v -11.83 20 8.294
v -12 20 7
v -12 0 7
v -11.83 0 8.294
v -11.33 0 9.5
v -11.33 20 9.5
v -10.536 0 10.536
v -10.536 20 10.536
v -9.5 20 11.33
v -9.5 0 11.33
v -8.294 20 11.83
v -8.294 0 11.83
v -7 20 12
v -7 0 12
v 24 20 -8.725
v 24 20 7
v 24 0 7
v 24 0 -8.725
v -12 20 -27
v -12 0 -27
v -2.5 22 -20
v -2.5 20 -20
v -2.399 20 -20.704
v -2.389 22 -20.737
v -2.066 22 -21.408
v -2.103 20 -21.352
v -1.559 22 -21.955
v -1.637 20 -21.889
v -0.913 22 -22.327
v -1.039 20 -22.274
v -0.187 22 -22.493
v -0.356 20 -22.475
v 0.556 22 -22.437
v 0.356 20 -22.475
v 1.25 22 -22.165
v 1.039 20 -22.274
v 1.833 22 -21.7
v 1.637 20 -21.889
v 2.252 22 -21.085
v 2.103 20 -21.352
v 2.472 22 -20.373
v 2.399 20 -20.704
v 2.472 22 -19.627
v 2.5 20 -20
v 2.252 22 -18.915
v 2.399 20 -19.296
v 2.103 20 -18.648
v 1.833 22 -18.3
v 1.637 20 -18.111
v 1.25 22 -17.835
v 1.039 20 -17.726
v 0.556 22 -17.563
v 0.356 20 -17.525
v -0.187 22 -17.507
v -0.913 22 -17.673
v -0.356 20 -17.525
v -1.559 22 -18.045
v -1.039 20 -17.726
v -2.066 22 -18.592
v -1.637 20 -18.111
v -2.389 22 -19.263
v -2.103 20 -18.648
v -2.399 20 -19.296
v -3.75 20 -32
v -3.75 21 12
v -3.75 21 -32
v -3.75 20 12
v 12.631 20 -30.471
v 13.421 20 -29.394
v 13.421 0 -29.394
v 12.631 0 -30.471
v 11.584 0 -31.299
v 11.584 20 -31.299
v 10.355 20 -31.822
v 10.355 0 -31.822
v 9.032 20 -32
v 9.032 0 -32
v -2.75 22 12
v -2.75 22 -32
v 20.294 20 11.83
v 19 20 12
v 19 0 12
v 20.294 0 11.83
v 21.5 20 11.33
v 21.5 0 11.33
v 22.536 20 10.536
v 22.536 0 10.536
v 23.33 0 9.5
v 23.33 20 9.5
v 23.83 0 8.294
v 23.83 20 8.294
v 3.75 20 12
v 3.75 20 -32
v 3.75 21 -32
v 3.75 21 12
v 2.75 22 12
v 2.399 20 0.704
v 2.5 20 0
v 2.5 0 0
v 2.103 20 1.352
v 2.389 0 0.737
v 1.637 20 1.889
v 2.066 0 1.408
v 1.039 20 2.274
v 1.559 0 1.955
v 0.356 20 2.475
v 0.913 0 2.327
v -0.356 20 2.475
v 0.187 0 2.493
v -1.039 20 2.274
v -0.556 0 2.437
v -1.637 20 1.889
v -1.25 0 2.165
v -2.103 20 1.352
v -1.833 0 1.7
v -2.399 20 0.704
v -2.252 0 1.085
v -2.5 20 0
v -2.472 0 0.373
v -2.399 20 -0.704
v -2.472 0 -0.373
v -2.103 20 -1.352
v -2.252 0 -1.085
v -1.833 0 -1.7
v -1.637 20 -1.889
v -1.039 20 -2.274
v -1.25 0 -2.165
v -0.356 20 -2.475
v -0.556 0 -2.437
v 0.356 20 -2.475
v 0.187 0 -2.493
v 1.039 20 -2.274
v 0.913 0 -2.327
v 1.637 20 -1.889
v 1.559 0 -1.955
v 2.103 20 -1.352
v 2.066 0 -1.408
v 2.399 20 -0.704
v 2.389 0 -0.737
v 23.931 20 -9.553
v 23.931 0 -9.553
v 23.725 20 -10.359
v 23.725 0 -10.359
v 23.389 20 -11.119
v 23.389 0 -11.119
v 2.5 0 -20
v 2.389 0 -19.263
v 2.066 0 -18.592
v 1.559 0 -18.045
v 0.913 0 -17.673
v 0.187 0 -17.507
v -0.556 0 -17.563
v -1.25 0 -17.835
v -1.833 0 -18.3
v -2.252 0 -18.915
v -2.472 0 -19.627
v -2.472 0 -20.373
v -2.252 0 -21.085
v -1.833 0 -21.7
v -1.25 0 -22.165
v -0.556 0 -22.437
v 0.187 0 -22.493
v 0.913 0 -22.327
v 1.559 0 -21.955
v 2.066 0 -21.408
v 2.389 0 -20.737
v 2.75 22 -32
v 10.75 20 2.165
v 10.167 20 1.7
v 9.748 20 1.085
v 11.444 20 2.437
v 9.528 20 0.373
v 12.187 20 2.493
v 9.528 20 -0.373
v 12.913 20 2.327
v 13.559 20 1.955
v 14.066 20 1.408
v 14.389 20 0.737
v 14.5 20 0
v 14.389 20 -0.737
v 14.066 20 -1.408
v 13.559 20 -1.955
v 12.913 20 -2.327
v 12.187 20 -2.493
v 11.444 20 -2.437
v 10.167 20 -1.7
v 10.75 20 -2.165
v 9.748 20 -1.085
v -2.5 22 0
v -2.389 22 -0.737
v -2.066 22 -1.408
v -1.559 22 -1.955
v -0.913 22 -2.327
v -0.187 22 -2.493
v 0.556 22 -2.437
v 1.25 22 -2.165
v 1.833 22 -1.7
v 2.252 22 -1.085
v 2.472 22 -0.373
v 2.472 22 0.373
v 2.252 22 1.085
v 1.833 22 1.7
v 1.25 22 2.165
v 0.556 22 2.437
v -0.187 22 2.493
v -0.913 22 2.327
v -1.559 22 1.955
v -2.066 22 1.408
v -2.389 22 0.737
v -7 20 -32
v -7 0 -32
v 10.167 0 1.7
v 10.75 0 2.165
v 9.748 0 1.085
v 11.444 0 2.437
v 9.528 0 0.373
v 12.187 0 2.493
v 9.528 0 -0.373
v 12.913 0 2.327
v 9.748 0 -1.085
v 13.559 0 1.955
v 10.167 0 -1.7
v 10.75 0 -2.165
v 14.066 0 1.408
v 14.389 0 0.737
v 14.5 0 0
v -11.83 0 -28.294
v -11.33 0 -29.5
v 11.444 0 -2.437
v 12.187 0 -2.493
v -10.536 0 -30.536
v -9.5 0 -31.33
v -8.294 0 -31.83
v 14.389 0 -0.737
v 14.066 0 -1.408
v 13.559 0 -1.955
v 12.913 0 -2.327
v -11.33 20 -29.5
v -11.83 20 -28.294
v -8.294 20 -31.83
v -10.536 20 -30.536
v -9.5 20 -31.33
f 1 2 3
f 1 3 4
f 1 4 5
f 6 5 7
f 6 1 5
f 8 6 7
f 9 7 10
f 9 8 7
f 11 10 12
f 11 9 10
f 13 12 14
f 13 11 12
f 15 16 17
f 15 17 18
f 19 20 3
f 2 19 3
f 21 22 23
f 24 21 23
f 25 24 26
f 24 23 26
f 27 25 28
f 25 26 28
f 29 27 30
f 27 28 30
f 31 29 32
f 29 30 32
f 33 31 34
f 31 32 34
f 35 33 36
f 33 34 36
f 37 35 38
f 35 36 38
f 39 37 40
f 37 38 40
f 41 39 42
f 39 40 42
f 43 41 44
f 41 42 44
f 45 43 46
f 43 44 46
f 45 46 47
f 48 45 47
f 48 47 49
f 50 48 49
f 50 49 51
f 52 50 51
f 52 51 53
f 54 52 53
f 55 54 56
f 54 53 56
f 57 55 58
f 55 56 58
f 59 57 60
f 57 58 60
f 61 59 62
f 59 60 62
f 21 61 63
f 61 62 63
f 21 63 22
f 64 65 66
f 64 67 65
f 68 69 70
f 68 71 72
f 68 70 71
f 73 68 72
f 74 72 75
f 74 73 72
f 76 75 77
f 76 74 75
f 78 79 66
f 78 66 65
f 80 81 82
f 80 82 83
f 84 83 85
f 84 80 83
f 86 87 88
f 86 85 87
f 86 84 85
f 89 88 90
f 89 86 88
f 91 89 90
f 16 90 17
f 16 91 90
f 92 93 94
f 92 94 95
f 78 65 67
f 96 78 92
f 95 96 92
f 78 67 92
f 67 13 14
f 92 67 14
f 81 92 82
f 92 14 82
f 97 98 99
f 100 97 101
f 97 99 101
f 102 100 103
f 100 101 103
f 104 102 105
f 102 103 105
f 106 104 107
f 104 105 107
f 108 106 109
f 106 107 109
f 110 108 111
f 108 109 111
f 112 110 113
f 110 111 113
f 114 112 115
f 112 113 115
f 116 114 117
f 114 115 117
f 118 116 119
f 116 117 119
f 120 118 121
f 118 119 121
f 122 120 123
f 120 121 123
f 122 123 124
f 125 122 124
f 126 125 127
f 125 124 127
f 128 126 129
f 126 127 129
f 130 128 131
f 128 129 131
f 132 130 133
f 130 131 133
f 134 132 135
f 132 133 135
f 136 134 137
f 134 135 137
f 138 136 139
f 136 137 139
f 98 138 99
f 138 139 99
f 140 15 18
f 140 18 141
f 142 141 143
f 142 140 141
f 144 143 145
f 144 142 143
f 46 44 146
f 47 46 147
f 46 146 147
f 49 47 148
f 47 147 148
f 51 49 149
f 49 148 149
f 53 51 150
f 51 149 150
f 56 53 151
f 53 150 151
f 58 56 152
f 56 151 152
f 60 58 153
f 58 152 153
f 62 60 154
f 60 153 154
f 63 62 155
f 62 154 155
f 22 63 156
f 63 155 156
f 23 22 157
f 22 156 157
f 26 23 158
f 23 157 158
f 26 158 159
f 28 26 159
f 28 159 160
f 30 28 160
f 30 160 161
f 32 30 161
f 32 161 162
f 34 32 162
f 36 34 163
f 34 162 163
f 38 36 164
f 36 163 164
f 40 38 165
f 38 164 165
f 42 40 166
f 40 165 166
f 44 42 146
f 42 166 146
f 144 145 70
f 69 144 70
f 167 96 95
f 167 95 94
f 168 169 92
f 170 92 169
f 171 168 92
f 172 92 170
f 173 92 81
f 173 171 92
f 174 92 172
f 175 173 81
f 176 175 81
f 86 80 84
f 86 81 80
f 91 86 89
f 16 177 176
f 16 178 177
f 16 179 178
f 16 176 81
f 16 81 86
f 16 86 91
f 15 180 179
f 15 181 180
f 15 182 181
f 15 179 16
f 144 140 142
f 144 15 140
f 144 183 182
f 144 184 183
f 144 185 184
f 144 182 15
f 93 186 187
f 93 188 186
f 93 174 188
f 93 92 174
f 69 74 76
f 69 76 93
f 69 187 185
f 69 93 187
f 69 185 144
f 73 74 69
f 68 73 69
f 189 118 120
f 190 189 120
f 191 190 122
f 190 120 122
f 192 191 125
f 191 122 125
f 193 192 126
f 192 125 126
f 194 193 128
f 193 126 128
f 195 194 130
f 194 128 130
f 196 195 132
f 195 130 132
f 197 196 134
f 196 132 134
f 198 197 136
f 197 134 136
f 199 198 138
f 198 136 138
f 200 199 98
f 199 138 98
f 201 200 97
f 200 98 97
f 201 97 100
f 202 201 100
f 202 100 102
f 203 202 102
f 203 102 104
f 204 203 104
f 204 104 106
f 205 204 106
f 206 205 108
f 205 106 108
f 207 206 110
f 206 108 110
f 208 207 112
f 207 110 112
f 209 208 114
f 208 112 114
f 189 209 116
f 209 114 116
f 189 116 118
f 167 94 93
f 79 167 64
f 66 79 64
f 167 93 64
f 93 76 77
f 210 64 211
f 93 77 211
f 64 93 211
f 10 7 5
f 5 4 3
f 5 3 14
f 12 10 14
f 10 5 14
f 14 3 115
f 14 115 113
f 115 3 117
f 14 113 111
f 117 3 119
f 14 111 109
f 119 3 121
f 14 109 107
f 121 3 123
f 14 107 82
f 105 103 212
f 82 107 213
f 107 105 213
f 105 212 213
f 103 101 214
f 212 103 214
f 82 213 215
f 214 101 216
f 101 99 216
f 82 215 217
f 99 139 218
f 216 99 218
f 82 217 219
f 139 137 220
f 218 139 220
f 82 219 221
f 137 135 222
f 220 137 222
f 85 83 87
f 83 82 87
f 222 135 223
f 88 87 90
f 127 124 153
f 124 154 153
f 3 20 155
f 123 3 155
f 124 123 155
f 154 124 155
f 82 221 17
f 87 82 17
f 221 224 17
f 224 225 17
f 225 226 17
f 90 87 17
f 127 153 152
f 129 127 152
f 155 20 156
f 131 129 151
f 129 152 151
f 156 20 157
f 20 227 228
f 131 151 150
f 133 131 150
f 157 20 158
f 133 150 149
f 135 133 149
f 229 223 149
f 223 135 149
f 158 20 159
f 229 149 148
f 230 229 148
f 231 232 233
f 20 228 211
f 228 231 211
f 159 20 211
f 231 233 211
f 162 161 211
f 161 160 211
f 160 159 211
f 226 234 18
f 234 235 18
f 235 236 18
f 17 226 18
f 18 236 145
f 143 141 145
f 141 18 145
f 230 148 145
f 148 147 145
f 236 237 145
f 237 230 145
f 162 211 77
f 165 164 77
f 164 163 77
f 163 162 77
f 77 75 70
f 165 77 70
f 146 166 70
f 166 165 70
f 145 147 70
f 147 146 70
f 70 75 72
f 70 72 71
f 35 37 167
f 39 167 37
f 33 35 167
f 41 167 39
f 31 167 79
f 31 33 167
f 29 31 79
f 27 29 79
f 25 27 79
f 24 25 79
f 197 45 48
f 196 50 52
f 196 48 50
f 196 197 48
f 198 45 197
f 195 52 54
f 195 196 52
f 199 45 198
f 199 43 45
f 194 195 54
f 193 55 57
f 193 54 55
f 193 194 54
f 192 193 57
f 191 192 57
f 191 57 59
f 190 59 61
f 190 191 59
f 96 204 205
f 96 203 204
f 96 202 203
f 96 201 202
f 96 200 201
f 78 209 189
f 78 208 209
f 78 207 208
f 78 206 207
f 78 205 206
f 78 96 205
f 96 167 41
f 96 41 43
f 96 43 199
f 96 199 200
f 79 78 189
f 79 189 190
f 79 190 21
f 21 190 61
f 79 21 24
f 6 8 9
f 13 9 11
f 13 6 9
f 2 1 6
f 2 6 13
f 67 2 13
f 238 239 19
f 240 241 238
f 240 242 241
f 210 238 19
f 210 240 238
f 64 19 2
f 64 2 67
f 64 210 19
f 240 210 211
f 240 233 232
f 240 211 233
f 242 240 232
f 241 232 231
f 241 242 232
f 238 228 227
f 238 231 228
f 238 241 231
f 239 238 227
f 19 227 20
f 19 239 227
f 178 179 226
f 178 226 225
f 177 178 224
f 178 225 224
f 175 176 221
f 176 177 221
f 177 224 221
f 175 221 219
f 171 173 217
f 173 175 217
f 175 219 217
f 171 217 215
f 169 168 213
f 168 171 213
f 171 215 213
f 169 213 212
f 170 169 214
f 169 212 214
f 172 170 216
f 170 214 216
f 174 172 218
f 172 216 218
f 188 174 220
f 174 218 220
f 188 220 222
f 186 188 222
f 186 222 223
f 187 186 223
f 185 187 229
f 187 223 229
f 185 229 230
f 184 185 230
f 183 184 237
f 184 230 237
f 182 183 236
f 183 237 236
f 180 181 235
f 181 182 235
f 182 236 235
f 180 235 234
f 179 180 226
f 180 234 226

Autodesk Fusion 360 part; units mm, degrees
sketch "Sketch1" plane through (0, 0, 0) normal (0, 1, 0) x (1, 0, 0)
  circle A0 centre (0, 0) radius 2.5
  circle A1 centre (12, 0) radius 2.5
  line L0 (-12, -12) -> (24, -12)
  line L1 (24, -12) -> (24, 10)
  line L2 (24, 10) -> (12, 32)
  line L3 (12, 32) -> (-12, 32)
  line L4 (-12, 32) -> (-12, -12)
  line L5 (0, 0) -> (0, 32) construction
  circle A2 centre (0, 20) radius 2.5
  line L6 (0, 0) -> (0, 20) construction
  point P0 (0, 10)
  dimension "d1" = 5
  dimension "d3" = 12
  dimension "d5" = 12
  dimension "d6" = 20
  dimension "d7" = 12
  dimension "d8" = 12
  dimension "d9" = 12
extrude "Extrude1" add sketch "Sketch1" along normal blind 20
fillet "Fillet1" radius 5 5 edges at (-12, 10, 12) (24, 10, 12) (-12, 10, -32) (12, 10, -32) (24, 10, -10)
sketch "Sketch2" plane through (0, 20, 0) normal (0, 1, 0) x (-1, 0, 0)
  arc A0 (-24, -8.725) -> (-23.3895, -11.1193) centre (-19, -8.725) ccw
  line L0 (-23.3895, -11.1193) -> (-13.4213, -29.3943)
  arc A1 (-13.4213, -29.3943) -> (-9.0318, -32) centre (-9.0318, -27) ccw
  line L1 (-9.0318, -32) -> (7, -32)
  arc A2 (7, -32) -> (12, -27) centre (7, -27) ccw
  line L2 (12, -27) -> (12, 7)
  arc A3 (12, 7) -> (7, 12) centre (7, 7) ccw
  line L3 (7, 12) -> (-19, 12)
  arc A4 (-19, 12) -> (-24, 7) centre (-19, 7) ccw
  line L4 (-24, 7) -> (-24, -8.725)
  circle A5 centre (0, -20) radius 2.5
  circle A6 centre (0, 0) radius 2.5
  circle A7 centre (-12, 0) radius 2.5
  line L5 (0, 0) -> (0, -20) construction
  line L6 (-3.75, 12) -> (3.75, 12)
  line L7 (3.75, 12) -> (3.75, -32)
  line L8 (3.75, -32) -> (-3.75, -32)
  line L9 (-3.75, -32) -> (-3.75, 12)
  dimension "d15" = 7.5
extrude "Extrude2" add sketch "Sketch2" along normal blind 2 contours L1 L3 L6 L7 L8 L9
chamfer "Chamfer1" distance 1 angle 45 2 edges at (3.75, 22, -10) (-3.75, 22, -10)
